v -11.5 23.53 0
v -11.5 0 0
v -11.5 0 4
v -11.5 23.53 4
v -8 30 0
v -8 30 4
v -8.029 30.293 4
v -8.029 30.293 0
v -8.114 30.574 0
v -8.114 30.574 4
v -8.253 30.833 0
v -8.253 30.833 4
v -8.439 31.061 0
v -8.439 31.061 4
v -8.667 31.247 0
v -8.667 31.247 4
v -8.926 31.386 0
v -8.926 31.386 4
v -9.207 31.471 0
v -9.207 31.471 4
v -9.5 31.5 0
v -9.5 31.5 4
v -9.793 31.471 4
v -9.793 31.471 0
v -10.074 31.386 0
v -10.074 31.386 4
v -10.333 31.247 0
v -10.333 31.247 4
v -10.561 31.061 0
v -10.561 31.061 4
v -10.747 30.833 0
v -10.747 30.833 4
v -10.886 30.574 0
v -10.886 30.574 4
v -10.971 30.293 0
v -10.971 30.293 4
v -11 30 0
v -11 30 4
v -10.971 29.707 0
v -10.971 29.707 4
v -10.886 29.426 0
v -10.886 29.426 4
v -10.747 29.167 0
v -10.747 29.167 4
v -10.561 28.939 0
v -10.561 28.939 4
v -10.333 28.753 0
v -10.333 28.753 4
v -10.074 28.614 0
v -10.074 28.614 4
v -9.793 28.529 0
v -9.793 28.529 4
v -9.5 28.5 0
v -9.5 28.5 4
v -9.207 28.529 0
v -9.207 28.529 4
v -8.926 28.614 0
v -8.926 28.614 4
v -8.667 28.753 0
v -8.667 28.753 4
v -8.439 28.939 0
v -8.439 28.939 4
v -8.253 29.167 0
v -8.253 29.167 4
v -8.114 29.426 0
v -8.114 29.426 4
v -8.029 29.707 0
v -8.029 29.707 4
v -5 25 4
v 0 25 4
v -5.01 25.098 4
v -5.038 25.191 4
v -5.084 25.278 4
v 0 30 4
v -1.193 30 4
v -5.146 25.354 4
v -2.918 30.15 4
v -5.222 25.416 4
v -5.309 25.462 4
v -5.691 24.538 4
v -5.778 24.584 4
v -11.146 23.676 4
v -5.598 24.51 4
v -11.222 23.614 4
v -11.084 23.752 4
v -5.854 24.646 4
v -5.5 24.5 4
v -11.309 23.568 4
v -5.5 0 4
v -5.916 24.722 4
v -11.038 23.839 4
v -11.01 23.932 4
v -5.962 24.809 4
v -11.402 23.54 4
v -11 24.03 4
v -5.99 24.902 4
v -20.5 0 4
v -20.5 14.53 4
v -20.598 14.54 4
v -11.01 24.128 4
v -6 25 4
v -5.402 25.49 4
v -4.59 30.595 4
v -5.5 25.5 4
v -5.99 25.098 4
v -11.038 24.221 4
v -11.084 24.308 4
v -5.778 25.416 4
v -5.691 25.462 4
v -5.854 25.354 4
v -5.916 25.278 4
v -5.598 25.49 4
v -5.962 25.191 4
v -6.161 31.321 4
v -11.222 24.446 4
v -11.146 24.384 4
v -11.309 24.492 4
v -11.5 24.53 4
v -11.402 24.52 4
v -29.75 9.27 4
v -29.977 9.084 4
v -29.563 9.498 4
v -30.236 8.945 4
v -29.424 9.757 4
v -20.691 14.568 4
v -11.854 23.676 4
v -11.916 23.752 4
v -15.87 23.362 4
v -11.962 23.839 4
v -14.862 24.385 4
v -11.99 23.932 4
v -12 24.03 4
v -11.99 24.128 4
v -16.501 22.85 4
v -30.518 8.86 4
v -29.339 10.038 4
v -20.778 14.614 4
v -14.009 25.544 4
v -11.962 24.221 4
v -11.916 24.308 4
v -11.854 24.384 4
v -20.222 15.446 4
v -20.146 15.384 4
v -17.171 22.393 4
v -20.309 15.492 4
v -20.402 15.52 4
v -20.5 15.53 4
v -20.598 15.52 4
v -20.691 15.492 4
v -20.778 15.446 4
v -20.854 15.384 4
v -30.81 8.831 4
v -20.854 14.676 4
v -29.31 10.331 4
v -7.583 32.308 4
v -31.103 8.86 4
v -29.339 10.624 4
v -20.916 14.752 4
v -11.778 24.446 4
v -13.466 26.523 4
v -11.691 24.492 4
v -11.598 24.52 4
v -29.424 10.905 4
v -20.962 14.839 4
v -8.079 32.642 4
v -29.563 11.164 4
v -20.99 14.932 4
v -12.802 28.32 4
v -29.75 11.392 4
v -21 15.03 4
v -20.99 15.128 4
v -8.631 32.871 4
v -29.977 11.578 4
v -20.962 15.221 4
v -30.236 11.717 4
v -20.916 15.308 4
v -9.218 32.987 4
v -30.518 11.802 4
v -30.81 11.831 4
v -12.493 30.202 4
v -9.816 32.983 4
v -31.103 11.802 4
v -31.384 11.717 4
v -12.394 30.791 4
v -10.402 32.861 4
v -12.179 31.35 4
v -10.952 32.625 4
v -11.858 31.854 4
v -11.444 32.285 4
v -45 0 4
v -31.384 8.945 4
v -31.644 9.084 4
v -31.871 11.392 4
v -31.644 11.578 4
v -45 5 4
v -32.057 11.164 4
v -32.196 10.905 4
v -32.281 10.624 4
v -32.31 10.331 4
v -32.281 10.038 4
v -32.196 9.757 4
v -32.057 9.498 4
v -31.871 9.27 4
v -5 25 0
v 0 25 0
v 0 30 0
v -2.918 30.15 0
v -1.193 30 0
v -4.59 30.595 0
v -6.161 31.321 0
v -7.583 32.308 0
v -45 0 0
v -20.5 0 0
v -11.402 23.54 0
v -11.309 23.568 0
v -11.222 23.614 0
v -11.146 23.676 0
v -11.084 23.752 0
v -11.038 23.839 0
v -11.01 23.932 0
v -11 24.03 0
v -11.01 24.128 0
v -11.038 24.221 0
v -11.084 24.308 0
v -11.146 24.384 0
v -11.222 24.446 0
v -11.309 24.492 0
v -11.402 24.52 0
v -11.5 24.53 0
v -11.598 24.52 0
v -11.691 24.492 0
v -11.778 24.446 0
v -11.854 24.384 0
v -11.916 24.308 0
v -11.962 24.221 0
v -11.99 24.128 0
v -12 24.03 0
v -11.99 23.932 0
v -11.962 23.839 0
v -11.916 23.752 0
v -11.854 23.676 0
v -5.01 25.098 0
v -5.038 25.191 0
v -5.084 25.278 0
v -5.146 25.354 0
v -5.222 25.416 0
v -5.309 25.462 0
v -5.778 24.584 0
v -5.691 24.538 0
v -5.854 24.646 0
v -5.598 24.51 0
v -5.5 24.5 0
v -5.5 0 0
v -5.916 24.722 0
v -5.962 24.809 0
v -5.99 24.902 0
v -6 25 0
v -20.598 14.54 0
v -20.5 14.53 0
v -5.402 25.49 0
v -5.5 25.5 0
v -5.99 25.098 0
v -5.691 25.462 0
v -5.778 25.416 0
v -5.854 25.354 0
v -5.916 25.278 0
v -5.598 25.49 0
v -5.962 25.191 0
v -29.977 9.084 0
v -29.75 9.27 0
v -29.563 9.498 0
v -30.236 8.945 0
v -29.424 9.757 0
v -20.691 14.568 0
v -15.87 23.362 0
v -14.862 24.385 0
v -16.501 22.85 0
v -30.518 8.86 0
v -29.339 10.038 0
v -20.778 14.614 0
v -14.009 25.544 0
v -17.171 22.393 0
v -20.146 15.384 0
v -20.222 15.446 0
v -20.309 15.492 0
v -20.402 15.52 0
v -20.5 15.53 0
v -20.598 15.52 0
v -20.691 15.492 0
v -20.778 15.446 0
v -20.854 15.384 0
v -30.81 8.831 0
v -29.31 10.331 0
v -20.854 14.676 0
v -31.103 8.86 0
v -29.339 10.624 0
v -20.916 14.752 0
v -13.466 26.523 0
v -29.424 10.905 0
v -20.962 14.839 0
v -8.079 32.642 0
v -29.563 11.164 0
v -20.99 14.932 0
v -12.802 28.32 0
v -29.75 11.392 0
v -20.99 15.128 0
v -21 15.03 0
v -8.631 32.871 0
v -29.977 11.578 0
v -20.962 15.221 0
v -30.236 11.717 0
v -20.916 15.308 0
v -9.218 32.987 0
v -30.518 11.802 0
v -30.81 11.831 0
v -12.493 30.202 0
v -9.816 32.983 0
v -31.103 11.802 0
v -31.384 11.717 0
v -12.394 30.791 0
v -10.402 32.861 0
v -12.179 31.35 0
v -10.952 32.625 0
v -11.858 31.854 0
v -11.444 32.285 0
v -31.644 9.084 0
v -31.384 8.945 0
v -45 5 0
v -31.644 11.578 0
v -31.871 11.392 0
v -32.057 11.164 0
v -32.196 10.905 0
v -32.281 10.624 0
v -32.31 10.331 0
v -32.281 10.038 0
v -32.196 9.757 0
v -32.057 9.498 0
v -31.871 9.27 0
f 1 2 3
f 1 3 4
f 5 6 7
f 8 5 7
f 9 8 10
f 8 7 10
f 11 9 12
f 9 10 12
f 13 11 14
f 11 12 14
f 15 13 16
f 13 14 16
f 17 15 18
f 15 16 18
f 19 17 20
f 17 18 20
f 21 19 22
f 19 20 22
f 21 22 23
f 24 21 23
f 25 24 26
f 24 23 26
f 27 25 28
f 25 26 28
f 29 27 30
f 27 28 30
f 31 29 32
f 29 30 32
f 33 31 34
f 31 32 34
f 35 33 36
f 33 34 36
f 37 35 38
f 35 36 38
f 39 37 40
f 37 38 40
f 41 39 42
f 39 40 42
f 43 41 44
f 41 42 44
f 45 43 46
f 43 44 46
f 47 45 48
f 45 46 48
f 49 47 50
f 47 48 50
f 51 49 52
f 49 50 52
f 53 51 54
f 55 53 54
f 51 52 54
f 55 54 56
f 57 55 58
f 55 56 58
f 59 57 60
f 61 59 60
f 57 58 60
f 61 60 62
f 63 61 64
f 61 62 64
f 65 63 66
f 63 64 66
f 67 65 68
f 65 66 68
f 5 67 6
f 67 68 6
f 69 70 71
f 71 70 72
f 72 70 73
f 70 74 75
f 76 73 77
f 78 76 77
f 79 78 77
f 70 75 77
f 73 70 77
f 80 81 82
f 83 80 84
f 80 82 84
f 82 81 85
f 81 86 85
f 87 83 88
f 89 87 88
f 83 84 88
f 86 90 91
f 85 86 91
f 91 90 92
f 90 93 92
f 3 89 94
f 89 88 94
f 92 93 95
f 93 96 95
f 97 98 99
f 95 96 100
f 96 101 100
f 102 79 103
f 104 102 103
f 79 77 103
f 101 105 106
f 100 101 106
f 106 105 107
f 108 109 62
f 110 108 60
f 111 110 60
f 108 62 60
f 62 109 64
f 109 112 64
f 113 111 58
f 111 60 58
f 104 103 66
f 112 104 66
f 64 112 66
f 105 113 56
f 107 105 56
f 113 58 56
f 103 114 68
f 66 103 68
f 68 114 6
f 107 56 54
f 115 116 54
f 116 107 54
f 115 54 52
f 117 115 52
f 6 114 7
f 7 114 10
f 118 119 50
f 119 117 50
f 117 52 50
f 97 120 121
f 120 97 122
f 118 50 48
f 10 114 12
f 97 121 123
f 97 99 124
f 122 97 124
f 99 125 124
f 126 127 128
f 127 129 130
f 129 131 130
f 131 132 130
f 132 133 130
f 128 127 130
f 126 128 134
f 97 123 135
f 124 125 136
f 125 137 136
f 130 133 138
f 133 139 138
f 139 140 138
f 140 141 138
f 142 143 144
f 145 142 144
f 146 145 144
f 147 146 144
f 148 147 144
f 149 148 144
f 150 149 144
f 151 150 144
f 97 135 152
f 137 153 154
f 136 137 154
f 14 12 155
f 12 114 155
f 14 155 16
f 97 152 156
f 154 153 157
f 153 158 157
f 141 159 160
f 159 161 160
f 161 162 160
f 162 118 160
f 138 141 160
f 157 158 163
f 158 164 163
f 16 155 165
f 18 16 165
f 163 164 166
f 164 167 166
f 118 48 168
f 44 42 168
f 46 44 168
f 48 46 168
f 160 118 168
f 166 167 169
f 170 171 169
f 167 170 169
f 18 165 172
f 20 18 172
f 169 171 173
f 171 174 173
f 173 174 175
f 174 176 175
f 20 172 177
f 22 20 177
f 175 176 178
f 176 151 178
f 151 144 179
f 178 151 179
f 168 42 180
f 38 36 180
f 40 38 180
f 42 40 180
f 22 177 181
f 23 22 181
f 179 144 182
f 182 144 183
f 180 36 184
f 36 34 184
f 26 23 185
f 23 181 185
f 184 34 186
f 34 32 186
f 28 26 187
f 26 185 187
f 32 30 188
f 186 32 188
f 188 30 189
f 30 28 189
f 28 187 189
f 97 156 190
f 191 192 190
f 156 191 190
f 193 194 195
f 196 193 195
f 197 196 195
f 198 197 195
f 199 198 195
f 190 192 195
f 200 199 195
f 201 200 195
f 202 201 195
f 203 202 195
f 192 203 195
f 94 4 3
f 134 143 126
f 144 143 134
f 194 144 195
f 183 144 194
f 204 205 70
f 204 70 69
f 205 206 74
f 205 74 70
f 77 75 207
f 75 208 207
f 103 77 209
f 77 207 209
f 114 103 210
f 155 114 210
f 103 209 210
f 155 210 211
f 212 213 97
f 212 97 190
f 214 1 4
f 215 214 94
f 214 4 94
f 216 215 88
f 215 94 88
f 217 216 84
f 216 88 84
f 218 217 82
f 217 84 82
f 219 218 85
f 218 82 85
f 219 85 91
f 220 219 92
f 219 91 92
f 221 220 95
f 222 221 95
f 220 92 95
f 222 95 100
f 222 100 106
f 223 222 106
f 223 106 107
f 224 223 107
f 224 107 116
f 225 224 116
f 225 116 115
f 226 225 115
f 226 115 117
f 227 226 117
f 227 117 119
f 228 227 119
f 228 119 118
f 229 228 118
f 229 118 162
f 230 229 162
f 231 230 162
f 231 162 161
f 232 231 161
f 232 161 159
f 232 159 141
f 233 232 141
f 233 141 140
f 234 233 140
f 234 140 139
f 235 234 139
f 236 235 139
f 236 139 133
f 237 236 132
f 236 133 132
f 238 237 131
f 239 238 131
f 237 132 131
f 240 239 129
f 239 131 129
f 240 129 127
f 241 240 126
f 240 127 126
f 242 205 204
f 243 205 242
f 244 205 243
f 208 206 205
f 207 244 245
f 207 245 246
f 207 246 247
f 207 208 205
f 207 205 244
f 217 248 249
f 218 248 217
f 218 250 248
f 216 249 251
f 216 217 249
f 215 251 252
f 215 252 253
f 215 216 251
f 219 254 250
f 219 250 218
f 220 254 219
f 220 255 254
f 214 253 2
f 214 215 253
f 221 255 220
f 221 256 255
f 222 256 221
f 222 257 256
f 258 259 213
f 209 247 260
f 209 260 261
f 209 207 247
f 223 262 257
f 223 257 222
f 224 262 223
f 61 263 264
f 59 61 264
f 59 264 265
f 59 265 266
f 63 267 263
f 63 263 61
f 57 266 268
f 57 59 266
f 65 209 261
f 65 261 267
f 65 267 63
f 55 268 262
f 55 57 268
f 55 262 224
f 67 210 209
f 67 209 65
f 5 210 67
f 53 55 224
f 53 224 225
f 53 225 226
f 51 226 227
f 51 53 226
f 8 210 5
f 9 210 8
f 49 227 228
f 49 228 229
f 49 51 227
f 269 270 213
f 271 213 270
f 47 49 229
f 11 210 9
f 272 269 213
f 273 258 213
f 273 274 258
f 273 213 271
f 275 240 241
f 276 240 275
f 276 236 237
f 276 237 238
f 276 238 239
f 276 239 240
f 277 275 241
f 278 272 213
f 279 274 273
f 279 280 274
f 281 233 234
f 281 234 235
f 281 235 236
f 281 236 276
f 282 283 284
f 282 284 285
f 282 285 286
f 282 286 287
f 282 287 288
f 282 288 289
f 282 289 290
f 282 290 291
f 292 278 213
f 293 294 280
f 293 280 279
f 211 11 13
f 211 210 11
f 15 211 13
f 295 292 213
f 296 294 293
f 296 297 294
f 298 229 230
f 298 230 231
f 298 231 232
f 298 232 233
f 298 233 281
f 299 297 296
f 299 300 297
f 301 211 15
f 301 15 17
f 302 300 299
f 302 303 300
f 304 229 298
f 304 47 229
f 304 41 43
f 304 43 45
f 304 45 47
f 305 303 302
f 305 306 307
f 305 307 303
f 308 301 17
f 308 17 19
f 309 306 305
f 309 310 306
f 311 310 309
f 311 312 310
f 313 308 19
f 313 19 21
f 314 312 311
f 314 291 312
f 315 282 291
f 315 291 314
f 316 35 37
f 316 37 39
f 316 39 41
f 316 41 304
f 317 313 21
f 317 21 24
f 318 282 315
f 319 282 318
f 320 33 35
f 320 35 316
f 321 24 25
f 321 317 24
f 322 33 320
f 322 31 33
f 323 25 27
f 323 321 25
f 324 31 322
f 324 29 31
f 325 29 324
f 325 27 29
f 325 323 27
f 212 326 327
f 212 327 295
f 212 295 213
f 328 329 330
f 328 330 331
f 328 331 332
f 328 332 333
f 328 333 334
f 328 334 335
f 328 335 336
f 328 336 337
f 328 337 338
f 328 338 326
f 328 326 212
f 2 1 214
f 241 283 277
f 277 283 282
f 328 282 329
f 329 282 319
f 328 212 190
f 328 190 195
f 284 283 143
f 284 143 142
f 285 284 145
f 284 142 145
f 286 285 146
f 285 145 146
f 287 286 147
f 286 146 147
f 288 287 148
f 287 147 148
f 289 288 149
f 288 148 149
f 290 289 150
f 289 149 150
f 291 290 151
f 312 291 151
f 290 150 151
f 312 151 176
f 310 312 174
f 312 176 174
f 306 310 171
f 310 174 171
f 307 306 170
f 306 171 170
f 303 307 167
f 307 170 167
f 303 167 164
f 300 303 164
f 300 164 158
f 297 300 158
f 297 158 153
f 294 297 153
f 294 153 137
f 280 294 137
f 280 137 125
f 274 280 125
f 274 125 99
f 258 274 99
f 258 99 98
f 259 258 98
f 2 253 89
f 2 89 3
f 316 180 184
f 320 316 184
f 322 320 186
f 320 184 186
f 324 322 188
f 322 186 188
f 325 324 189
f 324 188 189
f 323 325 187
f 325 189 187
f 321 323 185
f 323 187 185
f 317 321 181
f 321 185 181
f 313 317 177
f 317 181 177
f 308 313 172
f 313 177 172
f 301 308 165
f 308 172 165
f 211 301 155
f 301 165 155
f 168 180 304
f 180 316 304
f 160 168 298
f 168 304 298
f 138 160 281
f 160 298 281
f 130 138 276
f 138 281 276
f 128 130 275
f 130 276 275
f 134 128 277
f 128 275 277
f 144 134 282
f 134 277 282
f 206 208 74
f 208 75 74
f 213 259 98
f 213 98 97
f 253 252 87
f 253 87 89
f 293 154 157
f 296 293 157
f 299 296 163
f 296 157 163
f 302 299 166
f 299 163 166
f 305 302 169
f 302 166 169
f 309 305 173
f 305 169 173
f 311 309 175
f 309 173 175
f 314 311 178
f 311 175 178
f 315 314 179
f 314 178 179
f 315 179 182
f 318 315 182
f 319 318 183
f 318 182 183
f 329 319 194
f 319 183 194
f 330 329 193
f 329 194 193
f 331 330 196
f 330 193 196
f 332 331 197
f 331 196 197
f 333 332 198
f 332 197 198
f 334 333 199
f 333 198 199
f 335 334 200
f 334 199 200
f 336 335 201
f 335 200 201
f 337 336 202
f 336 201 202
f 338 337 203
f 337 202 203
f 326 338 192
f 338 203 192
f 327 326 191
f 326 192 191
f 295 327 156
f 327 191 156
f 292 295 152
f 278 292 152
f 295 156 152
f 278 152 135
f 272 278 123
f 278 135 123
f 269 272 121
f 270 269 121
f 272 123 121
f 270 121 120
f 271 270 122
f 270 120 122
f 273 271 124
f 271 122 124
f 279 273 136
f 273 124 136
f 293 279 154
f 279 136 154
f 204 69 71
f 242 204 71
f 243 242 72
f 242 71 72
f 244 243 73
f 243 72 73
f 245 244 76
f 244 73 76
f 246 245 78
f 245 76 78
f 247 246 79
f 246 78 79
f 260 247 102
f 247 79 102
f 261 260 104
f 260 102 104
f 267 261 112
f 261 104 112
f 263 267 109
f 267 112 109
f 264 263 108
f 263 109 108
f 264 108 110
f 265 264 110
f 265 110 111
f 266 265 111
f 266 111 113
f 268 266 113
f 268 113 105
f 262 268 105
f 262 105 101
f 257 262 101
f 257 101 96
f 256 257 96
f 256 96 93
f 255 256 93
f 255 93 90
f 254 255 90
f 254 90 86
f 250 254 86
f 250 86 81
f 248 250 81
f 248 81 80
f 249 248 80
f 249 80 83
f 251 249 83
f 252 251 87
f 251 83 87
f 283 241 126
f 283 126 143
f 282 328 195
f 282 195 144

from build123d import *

# Parameters (mm, degrees)
EXTRUDE_1_DEPTH     = 4
SKETCH_2_R          = 1.5
EXTRUDE_2_DEPTH     = 4
SKETCH_3_R          = 1.5
CUT_EXTRUDE_1_DEPTH = 4
FILLET_1_R          = 10
SKETCH_4_R          = 0.5
CUT_EXTRUDE_2_DEPTH = 4


with BuildPart() as part:
    # 草图1 → 凸台-拉伸1 (new body)
    with BuildSketch(Plane.XY):
        Polygon((-5.5, 0), (-11.5, 0), (-11.5, 24.03), (-20.5, 15.03), (-20.5, 0), (-45, 0), (-45, 5), (-5, 30), (0, 30), (0, 25), (-5.5, 25), align=None)
    extrude(amount=EXTRUDE_1_DEPTH)

    # 草图2 → 凸台-拉伸2 (add)
    with BuildSketch(Plane.XY.offset(4)):
        with BuildLine():
            Line((-6.5, 30), (-5, 30))
            Line((-5, 30), (-12.5, 25.3125))
            Line((-12.5, 25.3125), (-12.5, 30))
            ThreePointArc((-12.5, 30), (-9.5, 33), (-6.5, 30))
        make_face()
        with Locations((-9.5, 30)):
            Circle(SKETCH_2_R, mode=Mode.SUBTRACT)
    extrude(amount=-EXTRUDE_2_DEPTH)

    # 草图3 → 切除-拉伸1 (cut)
    with BuildSketch(Plane.XY.offset(4)):
        with Locations((-30.810217499, 10.330871139)):
            Circle(SKETCH_3_R)
    extrude(amount=-CUT_EXTRUDE_1_DEPTH, mode=Mode.SUBTRACT)

    # 圆角1
    fillet_1_edges = [part.edges().sort_by_distance(p)[0] for p in [
        (-6.5, 30, 2),
        (-12.5, 25.3125, 2),
    ]]
    fillet(fillet_1_edges, radius=FILLET_1_R)

    # 草图4 → 切除-拉伸2 (cut)
    with BuildSketch(Plane.XY.offset(4)):
        with Locations((-5.5, 25)):
            Circle(SKETCH_4_R)
        with Locations((-11.5, 24.03)):
            Circle(SKETCH_4_R)
        with Locations((-20.5, 15.03)):
            Circle(SKETCH_4_R)
    extrude(amount=-CUT_EXTRUDE_2_DEPTH, mode=Mode.SUBTRACT)


solid = part.part
